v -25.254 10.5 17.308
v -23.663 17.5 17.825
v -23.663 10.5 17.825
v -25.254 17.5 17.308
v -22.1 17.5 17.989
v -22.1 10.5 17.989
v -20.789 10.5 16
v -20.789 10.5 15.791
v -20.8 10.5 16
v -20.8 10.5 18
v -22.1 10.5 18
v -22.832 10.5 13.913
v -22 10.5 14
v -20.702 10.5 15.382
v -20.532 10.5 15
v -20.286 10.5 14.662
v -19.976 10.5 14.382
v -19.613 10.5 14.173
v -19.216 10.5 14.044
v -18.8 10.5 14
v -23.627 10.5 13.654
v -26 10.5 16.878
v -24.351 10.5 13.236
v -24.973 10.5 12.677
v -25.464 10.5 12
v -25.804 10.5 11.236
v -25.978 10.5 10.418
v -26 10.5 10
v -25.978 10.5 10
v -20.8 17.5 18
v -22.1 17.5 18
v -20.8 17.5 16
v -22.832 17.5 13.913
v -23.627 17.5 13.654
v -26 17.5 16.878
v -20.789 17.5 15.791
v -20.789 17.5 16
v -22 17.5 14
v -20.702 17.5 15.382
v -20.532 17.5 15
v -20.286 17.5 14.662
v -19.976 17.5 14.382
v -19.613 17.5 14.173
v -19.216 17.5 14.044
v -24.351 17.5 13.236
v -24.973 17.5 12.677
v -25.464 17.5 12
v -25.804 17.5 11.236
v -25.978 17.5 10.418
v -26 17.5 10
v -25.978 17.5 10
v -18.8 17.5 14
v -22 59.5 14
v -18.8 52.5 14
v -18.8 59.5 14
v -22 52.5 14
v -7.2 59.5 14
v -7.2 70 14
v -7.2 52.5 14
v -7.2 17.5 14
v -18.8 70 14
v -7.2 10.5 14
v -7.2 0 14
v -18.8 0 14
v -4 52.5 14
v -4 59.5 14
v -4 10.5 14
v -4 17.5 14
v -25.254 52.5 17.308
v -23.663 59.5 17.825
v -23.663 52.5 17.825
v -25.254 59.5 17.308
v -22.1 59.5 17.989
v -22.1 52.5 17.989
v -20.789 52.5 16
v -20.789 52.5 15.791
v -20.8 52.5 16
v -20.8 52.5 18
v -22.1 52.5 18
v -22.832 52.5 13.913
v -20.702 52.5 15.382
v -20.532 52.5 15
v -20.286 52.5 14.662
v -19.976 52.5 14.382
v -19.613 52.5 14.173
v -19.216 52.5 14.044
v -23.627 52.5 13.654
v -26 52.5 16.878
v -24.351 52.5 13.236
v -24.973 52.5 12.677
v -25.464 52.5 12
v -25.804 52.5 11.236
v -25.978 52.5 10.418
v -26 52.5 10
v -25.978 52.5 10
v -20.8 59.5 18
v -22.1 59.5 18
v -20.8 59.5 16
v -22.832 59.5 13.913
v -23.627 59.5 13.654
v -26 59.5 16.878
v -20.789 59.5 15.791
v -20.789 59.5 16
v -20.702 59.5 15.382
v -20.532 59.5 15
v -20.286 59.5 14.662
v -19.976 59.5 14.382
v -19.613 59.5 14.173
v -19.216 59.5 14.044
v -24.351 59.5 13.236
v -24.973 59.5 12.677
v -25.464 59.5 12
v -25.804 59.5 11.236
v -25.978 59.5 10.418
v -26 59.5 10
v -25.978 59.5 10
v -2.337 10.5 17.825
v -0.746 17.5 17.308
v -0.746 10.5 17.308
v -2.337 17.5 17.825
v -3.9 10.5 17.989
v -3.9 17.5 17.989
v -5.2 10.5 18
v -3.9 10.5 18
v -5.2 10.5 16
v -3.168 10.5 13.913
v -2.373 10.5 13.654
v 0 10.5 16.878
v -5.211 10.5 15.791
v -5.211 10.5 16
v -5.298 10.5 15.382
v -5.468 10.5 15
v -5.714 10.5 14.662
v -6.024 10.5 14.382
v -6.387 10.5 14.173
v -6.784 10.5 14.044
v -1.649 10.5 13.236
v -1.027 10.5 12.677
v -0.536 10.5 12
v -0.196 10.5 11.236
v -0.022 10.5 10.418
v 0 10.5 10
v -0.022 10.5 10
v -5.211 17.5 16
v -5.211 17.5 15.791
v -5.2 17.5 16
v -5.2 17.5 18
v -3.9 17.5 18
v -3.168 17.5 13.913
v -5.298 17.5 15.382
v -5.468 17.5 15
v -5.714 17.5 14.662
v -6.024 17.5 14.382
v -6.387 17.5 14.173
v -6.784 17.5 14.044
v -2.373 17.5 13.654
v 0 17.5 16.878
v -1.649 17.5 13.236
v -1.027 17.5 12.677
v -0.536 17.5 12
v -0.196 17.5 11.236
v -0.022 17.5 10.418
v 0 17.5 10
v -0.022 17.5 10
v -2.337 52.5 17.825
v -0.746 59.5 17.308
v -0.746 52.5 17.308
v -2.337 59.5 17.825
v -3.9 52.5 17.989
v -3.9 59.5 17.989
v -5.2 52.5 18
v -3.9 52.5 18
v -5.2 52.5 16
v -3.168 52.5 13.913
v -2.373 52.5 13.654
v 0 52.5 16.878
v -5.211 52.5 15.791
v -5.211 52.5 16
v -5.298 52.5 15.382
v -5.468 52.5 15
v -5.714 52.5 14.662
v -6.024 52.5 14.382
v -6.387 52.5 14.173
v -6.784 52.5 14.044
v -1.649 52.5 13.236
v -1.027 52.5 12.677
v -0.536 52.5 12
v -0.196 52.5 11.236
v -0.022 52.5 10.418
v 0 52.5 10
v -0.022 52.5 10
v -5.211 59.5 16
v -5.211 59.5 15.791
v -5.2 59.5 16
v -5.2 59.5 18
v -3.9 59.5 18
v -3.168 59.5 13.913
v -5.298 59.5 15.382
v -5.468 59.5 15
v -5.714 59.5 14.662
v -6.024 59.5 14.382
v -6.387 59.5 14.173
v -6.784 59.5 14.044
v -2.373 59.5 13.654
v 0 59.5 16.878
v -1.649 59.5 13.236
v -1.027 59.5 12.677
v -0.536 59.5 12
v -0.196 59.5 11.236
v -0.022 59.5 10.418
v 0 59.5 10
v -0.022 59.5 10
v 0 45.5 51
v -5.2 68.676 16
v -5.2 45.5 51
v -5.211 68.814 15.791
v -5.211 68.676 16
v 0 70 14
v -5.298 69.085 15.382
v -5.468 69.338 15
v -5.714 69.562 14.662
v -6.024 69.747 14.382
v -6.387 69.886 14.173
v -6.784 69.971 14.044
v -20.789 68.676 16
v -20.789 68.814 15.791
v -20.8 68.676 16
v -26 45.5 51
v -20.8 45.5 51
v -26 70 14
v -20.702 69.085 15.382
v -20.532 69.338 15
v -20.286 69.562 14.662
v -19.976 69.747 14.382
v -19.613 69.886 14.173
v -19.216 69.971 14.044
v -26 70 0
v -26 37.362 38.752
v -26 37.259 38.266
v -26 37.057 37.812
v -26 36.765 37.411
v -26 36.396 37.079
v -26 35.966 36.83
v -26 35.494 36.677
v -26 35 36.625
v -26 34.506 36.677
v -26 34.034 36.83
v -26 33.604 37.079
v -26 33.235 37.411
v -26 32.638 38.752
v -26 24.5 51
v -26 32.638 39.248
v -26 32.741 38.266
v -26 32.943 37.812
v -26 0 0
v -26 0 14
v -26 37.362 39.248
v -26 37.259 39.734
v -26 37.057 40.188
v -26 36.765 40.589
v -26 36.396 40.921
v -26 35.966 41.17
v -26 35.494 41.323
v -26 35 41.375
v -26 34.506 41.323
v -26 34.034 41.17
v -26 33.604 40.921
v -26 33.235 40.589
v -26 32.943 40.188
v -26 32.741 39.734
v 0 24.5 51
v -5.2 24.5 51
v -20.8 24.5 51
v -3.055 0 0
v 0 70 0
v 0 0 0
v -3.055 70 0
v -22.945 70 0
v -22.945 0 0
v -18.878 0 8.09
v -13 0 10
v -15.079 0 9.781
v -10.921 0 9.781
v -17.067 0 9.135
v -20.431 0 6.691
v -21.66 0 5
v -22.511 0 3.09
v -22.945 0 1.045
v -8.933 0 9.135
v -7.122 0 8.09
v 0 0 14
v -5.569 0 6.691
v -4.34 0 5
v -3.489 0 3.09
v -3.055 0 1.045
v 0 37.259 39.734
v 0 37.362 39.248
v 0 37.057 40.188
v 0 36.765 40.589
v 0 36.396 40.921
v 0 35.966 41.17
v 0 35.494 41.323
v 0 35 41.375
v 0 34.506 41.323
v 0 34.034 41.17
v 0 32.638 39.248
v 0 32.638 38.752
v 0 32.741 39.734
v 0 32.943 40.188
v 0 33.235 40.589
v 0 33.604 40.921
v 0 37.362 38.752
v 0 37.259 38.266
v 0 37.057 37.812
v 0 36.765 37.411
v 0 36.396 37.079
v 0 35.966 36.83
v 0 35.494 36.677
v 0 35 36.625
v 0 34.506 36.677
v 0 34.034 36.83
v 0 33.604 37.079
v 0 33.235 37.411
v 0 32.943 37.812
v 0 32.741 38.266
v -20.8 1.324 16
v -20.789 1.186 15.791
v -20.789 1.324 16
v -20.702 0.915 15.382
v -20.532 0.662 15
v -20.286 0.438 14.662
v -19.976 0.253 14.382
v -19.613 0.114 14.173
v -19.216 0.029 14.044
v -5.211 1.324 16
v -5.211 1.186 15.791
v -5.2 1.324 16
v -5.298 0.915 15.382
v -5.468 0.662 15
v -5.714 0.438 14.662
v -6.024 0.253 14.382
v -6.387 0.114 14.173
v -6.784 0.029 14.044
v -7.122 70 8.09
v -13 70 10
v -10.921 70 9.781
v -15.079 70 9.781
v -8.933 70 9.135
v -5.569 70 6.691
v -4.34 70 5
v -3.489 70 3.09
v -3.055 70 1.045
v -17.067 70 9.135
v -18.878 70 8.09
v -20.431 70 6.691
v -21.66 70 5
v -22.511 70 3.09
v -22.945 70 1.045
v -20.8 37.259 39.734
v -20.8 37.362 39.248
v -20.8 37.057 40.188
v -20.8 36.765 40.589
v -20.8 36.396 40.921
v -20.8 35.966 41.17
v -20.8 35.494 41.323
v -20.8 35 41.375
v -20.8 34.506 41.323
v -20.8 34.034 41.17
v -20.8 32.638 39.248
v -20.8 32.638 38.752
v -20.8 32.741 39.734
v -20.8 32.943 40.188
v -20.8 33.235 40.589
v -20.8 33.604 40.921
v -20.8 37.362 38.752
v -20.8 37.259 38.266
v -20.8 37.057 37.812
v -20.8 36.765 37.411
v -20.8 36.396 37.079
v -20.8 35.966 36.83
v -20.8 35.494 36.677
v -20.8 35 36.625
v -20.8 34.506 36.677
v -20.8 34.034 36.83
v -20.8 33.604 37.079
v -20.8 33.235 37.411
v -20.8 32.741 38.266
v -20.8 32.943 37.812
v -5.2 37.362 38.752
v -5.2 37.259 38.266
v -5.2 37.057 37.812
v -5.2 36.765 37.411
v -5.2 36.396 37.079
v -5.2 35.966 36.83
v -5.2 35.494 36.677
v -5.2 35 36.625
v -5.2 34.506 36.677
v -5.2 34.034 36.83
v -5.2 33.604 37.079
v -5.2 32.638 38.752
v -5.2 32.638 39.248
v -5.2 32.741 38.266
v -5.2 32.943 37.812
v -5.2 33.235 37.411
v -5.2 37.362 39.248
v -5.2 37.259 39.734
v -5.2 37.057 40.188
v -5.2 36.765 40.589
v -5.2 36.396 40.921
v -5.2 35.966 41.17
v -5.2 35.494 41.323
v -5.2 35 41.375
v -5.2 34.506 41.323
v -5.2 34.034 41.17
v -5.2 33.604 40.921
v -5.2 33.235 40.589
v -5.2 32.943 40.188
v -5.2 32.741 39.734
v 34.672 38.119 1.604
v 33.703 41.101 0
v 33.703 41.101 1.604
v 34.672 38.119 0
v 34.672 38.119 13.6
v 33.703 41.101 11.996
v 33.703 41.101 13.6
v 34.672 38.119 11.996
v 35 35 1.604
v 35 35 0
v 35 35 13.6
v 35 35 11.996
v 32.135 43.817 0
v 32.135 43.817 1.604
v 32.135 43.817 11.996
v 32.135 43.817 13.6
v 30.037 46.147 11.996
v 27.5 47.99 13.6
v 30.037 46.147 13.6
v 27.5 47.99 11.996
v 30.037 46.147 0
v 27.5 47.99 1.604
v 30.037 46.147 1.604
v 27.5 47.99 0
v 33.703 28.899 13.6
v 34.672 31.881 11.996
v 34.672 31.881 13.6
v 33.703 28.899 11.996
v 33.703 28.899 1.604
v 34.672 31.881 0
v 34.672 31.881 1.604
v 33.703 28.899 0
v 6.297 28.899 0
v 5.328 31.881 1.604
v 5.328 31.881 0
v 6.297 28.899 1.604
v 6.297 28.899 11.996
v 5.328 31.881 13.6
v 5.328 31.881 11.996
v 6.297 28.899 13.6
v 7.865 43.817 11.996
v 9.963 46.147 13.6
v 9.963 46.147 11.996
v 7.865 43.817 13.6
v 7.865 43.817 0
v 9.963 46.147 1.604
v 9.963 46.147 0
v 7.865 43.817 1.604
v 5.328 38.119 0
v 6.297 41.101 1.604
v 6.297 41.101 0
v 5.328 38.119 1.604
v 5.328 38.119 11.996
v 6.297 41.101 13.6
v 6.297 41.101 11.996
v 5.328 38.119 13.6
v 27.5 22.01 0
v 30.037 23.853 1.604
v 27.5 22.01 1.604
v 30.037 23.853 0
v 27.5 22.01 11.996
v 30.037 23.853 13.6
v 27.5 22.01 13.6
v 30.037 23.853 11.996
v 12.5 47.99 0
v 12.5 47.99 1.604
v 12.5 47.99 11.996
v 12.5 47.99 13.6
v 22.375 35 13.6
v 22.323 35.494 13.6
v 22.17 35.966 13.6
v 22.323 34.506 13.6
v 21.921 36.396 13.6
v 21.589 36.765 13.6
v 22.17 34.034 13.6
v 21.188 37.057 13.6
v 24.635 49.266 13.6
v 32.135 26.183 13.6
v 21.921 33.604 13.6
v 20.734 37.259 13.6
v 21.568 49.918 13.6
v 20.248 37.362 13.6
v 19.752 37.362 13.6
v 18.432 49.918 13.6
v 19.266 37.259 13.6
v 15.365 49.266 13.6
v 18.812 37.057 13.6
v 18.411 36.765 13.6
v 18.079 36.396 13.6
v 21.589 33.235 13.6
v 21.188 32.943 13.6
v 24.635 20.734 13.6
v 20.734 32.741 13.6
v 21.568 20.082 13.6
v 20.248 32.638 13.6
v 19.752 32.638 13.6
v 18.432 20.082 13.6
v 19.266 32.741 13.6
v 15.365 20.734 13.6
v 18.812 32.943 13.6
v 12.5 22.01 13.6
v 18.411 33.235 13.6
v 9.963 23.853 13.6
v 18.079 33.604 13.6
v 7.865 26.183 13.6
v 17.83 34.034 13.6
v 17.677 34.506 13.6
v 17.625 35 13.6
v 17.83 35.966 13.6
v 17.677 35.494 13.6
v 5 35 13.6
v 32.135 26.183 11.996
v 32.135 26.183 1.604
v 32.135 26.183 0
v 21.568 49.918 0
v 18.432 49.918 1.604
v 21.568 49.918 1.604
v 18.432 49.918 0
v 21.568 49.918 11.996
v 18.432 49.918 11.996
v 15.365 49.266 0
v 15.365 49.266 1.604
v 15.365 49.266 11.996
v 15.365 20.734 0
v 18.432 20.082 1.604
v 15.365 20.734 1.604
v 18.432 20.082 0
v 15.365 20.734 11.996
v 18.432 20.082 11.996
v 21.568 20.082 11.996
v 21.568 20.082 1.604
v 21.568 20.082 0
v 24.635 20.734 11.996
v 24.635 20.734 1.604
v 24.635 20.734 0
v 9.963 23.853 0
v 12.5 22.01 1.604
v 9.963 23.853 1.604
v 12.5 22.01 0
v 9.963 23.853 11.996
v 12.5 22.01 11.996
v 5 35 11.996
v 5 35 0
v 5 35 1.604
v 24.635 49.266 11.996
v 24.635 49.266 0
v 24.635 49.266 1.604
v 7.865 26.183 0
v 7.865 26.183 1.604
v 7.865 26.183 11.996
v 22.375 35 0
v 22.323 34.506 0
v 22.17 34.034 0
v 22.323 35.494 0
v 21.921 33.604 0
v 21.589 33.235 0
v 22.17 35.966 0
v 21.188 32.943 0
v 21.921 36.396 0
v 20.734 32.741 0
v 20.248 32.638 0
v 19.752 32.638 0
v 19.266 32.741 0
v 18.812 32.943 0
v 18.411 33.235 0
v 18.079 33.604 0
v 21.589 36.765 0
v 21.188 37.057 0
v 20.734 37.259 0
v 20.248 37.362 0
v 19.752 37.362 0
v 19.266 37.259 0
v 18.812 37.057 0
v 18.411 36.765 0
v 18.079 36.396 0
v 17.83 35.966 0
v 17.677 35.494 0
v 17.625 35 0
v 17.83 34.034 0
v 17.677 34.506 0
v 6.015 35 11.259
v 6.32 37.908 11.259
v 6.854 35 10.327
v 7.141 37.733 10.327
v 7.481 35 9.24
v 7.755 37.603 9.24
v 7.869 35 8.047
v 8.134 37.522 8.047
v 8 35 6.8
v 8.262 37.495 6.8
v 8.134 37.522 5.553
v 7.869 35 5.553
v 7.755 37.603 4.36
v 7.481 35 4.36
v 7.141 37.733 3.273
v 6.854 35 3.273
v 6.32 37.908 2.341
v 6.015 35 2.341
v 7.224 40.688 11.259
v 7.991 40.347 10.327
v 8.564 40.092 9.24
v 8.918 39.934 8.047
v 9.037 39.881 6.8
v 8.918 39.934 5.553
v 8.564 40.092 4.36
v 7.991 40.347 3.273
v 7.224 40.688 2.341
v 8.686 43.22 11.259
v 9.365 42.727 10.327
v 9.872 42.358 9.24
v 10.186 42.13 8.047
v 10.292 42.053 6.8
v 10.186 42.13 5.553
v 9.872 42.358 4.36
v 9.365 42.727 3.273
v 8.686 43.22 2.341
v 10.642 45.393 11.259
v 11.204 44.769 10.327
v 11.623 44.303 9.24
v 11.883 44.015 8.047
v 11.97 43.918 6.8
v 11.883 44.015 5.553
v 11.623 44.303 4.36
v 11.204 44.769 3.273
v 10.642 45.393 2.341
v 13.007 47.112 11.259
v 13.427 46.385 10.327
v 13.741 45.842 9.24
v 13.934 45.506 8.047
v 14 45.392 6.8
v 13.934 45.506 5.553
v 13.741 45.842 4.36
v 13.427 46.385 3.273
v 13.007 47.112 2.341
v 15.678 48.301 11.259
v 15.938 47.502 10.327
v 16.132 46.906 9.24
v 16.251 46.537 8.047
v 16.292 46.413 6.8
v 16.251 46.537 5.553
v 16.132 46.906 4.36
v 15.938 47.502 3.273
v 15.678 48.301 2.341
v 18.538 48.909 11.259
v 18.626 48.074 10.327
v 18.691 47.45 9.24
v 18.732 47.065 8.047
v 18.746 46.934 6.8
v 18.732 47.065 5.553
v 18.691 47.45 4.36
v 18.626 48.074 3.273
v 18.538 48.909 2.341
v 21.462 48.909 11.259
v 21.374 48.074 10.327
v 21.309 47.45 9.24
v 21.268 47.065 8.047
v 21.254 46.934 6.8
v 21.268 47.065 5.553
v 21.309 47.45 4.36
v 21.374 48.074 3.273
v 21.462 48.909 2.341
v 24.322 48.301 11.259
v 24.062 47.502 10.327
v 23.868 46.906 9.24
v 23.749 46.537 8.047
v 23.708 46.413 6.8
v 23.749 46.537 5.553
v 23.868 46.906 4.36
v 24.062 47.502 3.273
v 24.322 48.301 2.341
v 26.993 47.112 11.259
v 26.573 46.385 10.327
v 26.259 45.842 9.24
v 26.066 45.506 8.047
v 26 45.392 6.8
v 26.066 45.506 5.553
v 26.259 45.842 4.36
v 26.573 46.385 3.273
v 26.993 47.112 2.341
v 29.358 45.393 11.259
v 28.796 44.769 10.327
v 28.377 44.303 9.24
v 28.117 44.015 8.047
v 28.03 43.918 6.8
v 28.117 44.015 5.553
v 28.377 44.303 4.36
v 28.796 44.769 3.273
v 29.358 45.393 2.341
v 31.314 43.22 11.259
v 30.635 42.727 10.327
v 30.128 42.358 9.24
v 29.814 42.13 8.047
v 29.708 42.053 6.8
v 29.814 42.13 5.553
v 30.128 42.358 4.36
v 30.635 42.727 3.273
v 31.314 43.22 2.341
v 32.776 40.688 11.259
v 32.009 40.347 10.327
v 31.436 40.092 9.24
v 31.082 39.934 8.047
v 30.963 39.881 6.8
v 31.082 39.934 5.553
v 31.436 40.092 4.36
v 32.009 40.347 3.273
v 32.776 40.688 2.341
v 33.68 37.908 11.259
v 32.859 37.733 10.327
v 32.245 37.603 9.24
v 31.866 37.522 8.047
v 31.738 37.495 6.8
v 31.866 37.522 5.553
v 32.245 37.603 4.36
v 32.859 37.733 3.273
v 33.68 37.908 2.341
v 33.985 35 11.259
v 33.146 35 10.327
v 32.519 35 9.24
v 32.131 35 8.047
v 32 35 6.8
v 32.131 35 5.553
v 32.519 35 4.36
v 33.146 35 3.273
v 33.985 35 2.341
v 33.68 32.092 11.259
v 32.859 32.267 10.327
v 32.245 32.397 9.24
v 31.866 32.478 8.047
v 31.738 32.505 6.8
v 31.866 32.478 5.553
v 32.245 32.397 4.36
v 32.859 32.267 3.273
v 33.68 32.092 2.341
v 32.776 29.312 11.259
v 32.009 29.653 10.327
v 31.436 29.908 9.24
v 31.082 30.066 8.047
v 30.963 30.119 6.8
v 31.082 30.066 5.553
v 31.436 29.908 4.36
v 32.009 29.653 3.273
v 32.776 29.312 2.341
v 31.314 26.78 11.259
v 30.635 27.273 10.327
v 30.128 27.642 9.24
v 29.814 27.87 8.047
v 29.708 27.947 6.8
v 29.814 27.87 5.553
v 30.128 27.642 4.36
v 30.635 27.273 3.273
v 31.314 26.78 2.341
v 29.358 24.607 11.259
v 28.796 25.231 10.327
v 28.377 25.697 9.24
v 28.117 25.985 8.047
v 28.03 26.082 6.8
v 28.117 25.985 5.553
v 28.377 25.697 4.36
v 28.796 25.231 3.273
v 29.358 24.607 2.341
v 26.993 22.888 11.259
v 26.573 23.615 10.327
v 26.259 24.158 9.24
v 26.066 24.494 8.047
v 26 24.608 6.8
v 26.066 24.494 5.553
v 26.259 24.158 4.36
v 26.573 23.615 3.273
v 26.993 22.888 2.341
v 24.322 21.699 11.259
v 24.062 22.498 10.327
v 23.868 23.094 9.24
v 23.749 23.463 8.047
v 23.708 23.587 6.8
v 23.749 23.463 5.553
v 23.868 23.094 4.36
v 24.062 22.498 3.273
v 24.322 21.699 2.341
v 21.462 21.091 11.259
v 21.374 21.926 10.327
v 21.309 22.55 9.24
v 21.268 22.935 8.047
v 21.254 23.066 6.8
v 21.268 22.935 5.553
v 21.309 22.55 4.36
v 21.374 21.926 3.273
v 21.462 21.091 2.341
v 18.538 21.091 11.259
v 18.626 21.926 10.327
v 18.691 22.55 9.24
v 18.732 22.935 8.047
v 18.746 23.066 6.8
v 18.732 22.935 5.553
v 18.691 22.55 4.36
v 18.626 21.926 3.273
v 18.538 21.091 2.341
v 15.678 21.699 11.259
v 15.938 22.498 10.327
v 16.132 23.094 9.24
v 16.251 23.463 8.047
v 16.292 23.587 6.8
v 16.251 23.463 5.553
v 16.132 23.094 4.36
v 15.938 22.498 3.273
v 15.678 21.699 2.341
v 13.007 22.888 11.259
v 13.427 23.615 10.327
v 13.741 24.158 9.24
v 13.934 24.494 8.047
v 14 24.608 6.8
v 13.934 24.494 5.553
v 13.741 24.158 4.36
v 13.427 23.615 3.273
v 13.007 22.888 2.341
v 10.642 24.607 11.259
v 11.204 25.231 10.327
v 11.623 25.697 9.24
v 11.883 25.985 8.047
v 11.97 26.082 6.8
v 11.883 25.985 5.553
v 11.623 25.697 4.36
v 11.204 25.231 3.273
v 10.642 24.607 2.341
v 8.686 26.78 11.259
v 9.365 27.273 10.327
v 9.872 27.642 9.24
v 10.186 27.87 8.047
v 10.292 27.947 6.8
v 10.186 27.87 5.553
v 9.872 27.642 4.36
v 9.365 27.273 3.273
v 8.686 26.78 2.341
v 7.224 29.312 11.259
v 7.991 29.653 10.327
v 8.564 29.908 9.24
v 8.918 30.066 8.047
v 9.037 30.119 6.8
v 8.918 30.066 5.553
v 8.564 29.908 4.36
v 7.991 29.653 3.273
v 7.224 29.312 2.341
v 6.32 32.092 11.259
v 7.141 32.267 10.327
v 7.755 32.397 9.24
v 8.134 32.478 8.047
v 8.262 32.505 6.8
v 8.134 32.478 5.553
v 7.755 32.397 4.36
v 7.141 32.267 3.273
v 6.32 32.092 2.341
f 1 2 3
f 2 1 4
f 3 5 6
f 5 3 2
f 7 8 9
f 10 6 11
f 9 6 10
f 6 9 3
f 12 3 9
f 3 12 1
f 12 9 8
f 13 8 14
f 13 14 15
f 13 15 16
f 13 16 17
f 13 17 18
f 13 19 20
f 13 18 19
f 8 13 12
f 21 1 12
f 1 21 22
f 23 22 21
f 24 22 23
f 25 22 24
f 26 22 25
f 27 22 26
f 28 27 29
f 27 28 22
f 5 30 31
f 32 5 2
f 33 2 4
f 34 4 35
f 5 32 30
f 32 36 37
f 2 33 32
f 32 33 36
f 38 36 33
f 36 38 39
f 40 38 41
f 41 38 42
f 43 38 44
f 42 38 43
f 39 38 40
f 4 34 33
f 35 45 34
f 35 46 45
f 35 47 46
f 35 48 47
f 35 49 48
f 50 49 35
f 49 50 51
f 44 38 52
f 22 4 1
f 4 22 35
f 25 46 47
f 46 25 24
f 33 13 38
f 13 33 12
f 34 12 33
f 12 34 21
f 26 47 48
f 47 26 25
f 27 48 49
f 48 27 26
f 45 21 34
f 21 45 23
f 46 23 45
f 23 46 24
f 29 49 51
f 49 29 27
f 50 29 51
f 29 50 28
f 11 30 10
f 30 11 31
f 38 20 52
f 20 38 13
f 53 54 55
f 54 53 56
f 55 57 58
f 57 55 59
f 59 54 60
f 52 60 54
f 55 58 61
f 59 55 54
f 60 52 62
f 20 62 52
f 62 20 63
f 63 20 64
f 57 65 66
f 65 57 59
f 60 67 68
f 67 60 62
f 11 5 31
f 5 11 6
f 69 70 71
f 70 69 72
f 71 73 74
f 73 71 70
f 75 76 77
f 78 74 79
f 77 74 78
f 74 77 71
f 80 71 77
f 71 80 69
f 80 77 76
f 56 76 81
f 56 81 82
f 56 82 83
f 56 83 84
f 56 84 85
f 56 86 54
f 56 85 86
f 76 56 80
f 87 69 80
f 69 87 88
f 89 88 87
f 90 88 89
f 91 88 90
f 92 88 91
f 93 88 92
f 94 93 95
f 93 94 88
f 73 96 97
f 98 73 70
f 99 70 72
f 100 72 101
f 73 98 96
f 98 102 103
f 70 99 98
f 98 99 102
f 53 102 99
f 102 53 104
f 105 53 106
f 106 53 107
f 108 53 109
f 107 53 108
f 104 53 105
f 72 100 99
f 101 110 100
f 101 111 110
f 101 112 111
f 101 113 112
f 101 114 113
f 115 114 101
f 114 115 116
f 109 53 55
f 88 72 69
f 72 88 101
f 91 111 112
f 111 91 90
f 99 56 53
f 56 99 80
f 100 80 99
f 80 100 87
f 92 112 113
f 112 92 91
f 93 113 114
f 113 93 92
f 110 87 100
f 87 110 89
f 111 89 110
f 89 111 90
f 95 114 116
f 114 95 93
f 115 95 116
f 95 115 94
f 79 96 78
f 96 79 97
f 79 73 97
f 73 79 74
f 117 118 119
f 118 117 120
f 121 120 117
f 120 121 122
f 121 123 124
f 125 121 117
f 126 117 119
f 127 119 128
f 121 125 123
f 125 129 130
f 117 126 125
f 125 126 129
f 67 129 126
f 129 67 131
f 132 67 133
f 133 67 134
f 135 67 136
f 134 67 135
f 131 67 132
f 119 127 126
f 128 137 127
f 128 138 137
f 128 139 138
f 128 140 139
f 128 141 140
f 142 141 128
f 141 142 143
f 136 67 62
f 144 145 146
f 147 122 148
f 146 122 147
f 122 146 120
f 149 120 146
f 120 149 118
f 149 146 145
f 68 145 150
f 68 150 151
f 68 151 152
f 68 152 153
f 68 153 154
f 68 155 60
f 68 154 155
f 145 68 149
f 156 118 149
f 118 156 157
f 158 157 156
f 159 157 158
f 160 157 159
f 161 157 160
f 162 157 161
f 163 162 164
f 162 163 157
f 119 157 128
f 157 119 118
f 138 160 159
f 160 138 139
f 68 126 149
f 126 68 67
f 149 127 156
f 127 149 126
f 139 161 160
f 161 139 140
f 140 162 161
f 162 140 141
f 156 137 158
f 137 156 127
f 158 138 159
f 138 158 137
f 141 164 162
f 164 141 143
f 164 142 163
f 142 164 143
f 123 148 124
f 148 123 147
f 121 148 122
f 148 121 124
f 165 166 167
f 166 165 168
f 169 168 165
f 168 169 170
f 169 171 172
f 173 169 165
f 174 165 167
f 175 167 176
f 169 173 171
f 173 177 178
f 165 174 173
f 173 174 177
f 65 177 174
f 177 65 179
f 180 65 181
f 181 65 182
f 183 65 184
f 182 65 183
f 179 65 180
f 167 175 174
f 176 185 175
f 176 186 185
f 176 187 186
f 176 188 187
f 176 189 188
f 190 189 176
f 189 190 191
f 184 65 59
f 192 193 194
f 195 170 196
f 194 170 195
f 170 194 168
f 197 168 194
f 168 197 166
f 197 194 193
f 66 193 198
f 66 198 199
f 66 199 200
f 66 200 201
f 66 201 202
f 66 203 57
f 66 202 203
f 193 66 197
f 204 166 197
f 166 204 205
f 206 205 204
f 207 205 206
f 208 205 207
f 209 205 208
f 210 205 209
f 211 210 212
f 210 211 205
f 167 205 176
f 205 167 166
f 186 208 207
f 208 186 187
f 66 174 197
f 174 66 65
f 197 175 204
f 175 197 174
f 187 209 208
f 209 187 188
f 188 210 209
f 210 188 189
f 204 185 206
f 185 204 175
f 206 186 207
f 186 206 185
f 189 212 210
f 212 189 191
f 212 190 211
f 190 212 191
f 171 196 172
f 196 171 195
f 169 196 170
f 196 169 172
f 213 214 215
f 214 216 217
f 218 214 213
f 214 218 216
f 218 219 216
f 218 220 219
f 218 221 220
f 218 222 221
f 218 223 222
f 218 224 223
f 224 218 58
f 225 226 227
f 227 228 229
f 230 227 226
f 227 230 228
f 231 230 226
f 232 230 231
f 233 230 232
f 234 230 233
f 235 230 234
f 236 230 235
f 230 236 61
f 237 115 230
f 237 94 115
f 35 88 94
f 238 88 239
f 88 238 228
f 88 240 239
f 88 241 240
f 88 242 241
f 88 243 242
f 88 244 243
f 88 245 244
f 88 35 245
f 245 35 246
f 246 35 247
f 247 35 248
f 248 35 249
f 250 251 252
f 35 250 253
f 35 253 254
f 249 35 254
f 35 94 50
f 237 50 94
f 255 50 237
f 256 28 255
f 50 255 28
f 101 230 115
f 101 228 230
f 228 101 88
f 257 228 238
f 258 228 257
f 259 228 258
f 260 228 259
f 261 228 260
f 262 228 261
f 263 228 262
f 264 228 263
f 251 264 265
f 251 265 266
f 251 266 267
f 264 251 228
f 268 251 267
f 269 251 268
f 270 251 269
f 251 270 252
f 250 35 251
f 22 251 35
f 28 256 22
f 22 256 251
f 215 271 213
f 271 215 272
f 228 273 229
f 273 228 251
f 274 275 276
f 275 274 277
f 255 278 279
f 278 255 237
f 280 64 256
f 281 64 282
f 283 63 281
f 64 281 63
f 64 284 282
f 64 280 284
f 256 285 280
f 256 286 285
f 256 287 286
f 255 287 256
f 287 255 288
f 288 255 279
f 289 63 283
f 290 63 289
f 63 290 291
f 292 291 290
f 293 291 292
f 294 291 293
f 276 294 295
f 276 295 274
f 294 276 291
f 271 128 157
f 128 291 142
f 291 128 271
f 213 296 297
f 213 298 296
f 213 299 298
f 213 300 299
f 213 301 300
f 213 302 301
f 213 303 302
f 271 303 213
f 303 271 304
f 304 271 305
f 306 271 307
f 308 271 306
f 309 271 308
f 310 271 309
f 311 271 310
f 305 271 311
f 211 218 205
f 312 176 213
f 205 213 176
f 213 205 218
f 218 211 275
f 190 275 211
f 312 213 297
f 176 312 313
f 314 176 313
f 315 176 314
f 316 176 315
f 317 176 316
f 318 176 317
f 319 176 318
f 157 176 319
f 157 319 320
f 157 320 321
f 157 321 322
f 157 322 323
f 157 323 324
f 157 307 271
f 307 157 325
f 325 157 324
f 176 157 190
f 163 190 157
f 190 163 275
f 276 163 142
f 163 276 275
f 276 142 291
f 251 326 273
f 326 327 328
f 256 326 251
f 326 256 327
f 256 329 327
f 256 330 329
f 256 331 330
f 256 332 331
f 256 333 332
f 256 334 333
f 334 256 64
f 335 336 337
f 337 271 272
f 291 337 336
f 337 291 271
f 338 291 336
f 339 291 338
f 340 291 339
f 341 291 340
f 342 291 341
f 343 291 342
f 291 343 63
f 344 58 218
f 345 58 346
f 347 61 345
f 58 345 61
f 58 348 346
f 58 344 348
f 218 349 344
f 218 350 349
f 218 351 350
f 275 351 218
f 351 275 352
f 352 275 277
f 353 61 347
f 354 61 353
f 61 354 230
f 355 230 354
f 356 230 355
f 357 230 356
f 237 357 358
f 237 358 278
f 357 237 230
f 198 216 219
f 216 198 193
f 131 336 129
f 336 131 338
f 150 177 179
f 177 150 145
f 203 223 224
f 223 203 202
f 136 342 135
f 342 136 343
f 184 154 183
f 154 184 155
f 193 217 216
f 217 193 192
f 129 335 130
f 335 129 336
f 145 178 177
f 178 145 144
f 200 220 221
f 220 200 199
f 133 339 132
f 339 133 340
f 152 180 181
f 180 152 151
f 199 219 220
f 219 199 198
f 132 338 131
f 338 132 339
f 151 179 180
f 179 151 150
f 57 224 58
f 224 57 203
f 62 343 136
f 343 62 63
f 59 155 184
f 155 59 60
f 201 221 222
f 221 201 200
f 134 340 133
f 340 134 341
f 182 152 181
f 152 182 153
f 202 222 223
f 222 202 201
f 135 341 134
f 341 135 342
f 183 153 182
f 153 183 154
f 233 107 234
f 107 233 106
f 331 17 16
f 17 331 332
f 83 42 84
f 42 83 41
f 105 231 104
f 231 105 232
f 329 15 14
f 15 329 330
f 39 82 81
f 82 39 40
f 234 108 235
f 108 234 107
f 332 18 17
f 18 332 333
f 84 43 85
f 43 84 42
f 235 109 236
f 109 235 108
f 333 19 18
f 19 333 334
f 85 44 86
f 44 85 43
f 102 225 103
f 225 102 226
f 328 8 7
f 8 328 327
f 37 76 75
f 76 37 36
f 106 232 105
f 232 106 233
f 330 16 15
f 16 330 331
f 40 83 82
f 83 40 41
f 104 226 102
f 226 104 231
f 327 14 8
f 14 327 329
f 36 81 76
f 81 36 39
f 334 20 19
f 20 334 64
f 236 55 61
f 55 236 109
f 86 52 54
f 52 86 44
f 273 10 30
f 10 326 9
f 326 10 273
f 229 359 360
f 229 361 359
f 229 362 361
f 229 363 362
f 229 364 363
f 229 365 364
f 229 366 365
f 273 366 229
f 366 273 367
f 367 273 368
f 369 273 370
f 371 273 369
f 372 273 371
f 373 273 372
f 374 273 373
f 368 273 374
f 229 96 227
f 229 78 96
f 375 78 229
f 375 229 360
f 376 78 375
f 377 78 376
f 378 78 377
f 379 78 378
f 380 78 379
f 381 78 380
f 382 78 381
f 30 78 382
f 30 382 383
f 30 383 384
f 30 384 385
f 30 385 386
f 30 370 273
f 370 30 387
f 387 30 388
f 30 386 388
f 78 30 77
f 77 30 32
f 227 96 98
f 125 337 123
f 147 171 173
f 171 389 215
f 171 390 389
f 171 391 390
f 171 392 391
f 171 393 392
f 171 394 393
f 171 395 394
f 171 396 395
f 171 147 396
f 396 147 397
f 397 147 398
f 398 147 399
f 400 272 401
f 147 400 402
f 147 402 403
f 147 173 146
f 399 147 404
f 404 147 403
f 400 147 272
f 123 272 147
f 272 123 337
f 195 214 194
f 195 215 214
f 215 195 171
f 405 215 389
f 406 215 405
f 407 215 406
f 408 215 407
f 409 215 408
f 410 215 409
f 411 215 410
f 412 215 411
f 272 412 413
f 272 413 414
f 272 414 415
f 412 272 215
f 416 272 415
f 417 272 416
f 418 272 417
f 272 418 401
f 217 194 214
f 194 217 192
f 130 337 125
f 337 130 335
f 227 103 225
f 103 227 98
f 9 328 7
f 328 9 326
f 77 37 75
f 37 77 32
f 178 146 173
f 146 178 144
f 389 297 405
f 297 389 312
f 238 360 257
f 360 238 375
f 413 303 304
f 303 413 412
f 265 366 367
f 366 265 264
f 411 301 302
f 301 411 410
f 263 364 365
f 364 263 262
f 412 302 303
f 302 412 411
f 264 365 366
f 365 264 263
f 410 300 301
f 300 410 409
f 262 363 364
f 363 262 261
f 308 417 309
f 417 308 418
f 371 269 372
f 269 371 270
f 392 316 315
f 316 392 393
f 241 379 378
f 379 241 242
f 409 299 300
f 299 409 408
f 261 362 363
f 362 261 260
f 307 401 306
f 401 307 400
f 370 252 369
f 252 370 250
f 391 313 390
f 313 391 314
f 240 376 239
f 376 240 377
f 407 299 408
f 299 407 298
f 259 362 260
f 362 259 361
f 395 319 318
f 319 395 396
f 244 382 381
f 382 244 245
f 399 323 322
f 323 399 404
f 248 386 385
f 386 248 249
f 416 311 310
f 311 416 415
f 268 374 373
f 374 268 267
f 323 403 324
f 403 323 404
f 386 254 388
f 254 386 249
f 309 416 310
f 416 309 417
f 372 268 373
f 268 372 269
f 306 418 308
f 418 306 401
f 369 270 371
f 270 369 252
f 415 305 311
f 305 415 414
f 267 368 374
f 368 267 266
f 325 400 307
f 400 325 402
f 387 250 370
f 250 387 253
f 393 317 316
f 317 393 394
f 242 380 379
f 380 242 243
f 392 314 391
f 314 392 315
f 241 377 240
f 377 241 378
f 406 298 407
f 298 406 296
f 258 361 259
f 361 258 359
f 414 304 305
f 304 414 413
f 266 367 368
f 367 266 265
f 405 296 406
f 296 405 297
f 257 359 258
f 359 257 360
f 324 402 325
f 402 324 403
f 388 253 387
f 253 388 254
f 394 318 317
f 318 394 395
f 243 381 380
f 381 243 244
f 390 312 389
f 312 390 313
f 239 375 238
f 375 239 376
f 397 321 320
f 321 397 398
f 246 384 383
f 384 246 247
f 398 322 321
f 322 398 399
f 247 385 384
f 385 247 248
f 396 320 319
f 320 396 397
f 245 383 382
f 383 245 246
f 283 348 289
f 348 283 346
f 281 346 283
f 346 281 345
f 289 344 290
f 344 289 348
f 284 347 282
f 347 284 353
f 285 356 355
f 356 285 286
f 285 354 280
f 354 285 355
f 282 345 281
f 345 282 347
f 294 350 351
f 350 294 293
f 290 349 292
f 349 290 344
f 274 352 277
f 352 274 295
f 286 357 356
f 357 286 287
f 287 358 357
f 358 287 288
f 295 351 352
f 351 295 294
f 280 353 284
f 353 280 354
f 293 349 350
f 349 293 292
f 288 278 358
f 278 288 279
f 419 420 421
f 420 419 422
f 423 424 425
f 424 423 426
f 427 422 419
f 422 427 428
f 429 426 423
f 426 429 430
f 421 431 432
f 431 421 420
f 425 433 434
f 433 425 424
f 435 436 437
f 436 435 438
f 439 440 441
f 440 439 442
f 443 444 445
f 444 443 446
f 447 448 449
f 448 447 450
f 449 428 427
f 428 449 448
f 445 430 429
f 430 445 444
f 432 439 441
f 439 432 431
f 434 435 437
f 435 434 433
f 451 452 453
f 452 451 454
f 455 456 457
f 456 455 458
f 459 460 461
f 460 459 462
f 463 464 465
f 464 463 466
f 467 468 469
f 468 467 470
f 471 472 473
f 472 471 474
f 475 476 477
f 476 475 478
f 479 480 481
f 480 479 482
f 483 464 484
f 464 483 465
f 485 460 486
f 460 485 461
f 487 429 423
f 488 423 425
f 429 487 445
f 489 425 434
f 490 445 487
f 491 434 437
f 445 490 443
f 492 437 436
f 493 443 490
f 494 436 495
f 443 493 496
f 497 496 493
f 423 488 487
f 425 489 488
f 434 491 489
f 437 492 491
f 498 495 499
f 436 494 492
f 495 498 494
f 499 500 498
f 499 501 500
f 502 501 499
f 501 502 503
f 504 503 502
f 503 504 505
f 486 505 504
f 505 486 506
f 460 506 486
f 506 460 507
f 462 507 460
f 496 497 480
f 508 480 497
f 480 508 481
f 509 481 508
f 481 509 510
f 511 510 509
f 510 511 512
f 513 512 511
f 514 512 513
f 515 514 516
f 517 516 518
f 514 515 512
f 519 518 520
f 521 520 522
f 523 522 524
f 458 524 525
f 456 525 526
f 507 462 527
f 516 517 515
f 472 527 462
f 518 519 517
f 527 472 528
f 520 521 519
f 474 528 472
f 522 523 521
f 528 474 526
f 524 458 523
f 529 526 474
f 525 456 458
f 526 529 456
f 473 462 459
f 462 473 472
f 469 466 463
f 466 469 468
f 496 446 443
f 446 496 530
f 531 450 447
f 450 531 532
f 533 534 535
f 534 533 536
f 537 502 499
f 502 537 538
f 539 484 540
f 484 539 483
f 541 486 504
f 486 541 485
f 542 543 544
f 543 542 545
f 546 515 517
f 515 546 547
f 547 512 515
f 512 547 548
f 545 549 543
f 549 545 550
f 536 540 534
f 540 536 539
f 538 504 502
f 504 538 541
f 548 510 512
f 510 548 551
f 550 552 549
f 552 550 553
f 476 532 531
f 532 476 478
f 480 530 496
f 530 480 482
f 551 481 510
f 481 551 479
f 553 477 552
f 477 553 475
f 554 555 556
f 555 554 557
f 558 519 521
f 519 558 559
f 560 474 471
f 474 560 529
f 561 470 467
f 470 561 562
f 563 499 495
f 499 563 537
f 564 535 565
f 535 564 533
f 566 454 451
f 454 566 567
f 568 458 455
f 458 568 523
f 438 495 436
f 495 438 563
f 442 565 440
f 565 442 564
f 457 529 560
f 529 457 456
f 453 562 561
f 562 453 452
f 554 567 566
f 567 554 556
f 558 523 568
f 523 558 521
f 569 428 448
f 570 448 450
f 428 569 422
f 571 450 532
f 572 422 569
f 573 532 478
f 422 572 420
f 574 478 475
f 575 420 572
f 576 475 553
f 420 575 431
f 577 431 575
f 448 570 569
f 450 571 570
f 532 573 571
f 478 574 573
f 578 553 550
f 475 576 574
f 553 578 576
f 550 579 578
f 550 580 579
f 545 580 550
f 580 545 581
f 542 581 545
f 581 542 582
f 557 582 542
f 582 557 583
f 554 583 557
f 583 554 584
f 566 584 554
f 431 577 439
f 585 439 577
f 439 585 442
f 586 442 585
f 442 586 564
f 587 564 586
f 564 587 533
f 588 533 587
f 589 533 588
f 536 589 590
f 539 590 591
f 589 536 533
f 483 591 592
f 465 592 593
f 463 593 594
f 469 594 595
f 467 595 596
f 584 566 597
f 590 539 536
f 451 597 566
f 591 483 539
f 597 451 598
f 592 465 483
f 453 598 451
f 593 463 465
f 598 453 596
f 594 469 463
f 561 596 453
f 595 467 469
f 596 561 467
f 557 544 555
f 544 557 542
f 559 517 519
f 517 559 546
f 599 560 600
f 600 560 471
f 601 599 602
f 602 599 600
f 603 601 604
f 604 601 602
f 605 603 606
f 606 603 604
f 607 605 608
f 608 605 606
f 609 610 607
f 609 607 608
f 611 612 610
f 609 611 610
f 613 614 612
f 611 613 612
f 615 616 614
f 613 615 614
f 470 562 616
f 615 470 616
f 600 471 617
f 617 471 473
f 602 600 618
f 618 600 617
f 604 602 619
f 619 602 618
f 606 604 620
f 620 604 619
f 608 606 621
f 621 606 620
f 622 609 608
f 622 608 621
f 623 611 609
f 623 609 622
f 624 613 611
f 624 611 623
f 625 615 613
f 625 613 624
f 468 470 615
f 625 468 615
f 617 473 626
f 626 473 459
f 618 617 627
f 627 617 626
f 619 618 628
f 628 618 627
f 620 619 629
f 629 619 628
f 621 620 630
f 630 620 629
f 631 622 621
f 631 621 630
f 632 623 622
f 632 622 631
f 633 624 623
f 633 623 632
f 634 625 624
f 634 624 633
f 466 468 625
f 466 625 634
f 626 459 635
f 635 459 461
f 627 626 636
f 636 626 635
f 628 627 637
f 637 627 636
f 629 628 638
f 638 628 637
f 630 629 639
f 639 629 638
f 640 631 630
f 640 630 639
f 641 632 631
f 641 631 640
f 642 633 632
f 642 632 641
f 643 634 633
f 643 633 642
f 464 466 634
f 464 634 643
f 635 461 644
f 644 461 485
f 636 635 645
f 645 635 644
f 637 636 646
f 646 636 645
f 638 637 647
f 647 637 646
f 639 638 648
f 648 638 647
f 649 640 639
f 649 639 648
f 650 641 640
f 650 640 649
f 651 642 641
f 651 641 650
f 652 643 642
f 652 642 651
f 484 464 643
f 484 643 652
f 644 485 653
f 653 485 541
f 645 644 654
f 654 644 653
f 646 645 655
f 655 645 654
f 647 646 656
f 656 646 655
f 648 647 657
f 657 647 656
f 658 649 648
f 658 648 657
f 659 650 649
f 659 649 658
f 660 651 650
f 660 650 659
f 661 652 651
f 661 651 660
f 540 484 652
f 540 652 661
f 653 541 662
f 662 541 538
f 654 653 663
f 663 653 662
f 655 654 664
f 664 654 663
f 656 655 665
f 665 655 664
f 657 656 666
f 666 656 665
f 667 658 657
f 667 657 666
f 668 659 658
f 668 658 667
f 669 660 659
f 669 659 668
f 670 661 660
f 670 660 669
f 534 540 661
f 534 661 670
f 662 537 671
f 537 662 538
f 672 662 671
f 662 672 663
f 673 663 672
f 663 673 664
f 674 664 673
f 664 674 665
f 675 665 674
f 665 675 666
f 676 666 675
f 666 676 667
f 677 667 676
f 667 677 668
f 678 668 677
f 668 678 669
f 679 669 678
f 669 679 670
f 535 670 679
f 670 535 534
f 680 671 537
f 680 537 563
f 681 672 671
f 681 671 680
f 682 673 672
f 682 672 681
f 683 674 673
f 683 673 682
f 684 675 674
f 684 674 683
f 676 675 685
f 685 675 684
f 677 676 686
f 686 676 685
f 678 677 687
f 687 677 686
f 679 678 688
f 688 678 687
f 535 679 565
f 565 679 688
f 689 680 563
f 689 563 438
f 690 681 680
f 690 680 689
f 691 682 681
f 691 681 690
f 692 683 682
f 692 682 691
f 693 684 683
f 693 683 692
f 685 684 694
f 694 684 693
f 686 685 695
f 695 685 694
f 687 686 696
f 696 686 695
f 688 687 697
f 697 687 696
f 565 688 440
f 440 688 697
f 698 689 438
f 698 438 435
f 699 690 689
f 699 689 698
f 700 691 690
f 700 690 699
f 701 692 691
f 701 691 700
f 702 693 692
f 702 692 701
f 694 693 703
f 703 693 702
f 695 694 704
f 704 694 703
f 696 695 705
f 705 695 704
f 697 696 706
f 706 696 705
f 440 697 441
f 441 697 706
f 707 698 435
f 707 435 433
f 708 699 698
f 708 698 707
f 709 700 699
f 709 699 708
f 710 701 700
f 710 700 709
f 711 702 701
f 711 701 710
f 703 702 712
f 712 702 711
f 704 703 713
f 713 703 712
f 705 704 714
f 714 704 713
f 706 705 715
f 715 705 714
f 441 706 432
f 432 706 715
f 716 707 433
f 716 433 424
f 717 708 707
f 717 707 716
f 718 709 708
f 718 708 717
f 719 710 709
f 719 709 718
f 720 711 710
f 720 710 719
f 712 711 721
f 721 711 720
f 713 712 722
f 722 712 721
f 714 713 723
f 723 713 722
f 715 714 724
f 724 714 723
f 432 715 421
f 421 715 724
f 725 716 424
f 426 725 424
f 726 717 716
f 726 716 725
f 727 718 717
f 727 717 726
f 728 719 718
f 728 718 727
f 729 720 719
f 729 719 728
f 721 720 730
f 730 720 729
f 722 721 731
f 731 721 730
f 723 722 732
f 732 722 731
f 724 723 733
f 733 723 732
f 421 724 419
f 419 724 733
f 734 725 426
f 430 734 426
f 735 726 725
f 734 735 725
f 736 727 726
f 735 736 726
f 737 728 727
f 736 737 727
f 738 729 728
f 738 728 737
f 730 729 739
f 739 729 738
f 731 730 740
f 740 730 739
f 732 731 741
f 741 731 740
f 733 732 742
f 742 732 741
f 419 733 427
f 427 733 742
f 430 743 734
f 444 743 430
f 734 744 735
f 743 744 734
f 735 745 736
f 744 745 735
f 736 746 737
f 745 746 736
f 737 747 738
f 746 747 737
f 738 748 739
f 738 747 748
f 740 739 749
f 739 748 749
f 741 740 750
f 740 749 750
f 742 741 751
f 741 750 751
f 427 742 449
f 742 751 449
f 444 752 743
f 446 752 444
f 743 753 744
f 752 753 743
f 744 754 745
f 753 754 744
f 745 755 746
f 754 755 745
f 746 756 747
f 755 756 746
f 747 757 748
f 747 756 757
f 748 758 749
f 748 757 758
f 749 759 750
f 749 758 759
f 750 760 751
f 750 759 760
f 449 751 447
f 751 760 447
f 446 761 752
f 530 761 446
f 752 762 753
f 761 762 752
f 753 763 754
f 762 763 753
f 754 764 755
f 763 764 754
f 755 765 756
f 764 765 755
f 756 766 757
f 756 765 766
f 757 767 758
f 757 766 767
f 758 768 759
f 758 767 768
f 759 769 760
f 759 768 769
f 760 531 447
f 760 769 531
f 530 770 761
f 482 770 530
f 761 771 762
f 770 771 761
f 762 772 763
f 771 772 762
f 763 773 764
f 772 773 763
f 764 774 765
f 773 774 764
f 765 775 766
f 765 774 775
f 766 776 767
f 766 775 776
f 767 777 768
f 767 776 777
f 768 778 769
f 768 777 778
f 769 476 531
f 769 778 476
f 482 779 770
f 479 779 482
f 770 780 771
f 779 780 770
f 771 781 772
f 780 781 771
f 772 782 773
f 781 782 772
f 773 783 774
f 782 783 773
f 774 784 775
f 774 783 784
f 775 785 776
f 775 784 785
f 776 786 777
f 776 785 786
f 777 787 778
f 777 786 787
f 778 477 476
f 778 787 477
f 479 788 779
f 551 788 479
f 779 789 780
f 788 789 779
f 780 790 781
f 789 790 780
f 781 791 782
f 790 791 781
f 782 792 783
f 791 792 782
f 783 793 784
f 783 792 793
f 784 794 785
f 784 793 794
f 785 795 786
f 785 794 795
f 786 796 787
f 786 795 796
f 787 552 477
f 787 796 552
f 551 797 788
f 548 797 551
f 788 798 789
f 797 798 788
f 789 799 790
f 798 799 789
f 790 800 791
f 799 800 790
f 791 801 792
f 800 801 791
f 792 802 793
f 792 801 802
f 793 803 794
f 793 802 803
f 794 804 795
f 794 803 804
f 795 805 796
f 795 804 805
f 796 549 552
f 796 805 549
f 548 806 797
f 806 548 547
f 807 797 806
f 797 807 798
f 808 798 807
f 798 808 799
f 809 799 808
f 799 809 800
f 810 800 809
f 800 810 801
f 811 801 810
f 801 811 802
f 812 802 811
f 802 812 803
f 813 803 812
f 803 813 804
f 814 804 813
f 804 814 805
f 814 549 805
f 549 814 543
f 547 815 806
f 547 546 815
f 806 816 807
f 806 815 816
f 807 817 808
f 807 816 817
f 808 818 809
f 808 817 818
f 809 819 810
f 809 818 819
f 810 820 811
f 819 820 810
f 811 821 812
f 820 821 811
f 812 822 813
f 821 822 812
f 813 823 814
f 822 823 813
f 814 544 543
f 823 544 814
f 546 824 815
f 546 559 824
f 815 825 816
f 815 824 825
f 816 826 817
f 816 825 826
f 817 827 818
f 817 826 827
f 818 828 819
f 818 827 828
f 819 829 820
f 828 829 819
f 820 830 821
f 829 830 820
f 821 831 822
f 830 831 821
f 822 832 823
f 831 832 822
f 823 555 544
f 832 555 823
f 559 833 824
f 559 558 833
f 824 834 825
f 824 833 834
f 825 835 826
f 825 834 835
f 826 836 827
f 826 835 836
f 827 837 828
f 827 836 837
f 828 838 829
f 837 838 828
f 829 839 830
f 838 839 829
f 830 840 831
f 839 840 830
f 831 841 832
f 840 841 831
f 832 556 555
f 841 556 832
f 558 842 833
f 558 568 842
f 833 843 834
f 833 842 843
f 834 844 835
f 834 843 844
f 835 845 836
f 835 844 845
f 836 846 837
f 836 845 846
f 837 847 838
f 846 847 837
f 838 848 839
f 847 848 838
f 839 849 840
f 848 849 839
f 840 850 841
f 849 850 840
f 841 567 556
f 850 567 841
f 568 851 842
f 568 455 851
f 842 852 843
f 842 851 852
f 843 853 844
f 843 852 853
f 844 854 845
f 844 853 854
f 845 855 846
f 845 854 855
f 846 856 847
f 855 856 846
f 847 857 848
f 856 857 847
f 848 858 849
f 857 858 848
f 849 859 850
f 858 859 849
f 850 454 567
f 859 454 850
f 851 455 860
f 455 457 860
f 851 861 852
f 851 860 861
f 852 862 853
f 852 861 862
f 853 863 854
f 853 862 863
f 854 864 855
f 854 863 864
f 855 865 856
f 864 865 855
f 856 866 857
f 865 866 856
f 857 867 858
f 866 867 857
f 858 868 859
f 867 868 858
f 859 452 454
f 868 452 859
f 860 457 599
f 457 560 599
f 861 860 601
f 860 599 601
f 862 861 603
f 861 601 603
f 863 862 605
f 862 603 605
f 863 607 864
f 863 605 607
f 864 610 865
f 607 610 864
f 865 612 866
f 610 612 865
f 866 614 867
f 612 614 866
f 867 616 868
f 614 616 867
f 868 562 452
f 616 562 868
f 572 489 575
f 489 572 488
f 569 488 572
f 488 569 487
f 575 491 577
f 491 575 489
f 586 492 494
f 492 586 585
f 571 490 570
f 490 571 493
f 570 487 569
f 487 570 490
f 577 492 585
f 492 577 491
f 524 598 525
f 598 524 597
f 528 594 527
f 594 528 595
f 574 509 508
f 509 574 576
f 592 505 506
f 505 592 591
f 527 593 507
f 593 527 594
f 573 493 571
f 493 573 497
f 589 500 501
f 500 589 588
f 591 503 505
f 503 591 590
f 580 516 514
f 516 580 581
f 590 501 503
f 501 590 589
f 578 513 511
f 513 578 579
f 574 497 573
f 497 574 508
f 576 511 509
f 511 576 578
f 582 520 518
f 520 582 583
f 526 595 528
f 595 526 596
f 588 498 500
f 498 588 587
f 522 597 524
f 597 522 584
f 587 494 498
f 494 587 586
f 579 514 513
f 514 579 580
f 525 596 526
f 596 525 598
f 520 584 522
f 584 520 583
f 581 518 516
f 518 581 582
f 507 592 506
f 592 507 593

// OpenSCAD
mntLength = 70;
mntDepth = 14;
mntWidth = 26;
chainClr = 5;
rollerDia = 20;
boltDia = 4.75;
chamfer = 2;
pipeDia = 20;


rotate([0,270,0])
difference(){

  //main geometry
  linear_extrude(height = mntWidth){
    polygon([

      [0,0],
      [0,mntLength],
      [mntDepth,mntLength],
      [mntDepth+chainClr+rollerDia*1.6,mntLength*.65],
      [mntDepth+chainClr+rollerDia*1.6,mntLength*.35],
      [mntDepth,0],
      [0,0]

    ]);
  }

  //Chain path cut-away

  translate([mntDepth+chamfer,0,mntWidth*.2+chamfer])
    rotate([270,0,0])
      cylinder(h = mntLength, r=chamfer, $fn=30);

  translate([mntDepth+chamfer,0,mntWidth*.8-chamfer])
    rotate([270,0,0])
      cylinder(h = mntLength, r=chamfer, $fn=30);

  translate([mntDepth+chamfer,0,mntWidth*.2])
    cube([chainClr+rollerDia*2-chamfer,
          mntLength,
          mntWidth*.6]);

  translate([mntDepth,0,mntWidth*.2+chamfer])
    cube([chainClr+rollerDia*1.51,
          mntLength,
          mntWidth*.6-chamfer*2]);

  //bolt hole
  translate([mntDepth+chainClr+rollerDia,mntLength/2,-.01])
    cylinder(h = mntWidth+.02, r=boltDia/2, $fn=30);
  
  //pipe cutaway
  translate([0,-.01,mntWidth/2])
    rotate([270,0,0])
      cylinder(h = mntLength+.02, r=pipeDia/2, $fn=30);

  //ziptie holes
  ziptiehole(mntDepth-4,mntLength*.15,mntWidth-4);
  ziptiehole(mntDepth-4,mntLength*.85-7,mntWidth-4);
  mirror([0,0,1])ziptiehole(mntDepth-4,mntLength*.15,-4);
  mirror([0,0,1])ziptiehole(mntDepth-4,mntLength*.85-7,-4);

}



//Roller
//rotate([0,270,0])translate([mntDepth+chainClr+rollerDia,mntLength/2,mntWidth*.2+1])//test in place
translate([rollerDia,mntLength/2,0])//print location

difference(){
  cylinder(h = mntWidth*.6-2, r=rollerDia*.75, $fn=30);

  translate([0, 0, (mntWidth*.6-2)/2])
    rotate_extrude(convexity = 30)
      translate([rollerDia*.9, 0, 0])
        circle(r = rollerDia*.3, $fn = 30);

  //bolt hole
    cylinder(h = mntWidth+.02, r=boltDia/2, $fn=30);

}


module ziptiehole(posX,posY,posZ){
  translate([posX,posY,posZ])
    rotate([270,0,0])
      union(){

        translate([4,-0.1,0])
          cube([4,10,7]);
        
        difference(){
          cylinder(h = 7, r=8, $fn=30);

          translate([0,0,-0.01])
            cylinder(h = 7.02, r=4, $fn=30);      
          translate([-10,0,-0.01])
            cube([20,10,10.2]);
          translate([-10,-10,-0.01])
            cube([10,20,10.2]);
        }
      }

}
